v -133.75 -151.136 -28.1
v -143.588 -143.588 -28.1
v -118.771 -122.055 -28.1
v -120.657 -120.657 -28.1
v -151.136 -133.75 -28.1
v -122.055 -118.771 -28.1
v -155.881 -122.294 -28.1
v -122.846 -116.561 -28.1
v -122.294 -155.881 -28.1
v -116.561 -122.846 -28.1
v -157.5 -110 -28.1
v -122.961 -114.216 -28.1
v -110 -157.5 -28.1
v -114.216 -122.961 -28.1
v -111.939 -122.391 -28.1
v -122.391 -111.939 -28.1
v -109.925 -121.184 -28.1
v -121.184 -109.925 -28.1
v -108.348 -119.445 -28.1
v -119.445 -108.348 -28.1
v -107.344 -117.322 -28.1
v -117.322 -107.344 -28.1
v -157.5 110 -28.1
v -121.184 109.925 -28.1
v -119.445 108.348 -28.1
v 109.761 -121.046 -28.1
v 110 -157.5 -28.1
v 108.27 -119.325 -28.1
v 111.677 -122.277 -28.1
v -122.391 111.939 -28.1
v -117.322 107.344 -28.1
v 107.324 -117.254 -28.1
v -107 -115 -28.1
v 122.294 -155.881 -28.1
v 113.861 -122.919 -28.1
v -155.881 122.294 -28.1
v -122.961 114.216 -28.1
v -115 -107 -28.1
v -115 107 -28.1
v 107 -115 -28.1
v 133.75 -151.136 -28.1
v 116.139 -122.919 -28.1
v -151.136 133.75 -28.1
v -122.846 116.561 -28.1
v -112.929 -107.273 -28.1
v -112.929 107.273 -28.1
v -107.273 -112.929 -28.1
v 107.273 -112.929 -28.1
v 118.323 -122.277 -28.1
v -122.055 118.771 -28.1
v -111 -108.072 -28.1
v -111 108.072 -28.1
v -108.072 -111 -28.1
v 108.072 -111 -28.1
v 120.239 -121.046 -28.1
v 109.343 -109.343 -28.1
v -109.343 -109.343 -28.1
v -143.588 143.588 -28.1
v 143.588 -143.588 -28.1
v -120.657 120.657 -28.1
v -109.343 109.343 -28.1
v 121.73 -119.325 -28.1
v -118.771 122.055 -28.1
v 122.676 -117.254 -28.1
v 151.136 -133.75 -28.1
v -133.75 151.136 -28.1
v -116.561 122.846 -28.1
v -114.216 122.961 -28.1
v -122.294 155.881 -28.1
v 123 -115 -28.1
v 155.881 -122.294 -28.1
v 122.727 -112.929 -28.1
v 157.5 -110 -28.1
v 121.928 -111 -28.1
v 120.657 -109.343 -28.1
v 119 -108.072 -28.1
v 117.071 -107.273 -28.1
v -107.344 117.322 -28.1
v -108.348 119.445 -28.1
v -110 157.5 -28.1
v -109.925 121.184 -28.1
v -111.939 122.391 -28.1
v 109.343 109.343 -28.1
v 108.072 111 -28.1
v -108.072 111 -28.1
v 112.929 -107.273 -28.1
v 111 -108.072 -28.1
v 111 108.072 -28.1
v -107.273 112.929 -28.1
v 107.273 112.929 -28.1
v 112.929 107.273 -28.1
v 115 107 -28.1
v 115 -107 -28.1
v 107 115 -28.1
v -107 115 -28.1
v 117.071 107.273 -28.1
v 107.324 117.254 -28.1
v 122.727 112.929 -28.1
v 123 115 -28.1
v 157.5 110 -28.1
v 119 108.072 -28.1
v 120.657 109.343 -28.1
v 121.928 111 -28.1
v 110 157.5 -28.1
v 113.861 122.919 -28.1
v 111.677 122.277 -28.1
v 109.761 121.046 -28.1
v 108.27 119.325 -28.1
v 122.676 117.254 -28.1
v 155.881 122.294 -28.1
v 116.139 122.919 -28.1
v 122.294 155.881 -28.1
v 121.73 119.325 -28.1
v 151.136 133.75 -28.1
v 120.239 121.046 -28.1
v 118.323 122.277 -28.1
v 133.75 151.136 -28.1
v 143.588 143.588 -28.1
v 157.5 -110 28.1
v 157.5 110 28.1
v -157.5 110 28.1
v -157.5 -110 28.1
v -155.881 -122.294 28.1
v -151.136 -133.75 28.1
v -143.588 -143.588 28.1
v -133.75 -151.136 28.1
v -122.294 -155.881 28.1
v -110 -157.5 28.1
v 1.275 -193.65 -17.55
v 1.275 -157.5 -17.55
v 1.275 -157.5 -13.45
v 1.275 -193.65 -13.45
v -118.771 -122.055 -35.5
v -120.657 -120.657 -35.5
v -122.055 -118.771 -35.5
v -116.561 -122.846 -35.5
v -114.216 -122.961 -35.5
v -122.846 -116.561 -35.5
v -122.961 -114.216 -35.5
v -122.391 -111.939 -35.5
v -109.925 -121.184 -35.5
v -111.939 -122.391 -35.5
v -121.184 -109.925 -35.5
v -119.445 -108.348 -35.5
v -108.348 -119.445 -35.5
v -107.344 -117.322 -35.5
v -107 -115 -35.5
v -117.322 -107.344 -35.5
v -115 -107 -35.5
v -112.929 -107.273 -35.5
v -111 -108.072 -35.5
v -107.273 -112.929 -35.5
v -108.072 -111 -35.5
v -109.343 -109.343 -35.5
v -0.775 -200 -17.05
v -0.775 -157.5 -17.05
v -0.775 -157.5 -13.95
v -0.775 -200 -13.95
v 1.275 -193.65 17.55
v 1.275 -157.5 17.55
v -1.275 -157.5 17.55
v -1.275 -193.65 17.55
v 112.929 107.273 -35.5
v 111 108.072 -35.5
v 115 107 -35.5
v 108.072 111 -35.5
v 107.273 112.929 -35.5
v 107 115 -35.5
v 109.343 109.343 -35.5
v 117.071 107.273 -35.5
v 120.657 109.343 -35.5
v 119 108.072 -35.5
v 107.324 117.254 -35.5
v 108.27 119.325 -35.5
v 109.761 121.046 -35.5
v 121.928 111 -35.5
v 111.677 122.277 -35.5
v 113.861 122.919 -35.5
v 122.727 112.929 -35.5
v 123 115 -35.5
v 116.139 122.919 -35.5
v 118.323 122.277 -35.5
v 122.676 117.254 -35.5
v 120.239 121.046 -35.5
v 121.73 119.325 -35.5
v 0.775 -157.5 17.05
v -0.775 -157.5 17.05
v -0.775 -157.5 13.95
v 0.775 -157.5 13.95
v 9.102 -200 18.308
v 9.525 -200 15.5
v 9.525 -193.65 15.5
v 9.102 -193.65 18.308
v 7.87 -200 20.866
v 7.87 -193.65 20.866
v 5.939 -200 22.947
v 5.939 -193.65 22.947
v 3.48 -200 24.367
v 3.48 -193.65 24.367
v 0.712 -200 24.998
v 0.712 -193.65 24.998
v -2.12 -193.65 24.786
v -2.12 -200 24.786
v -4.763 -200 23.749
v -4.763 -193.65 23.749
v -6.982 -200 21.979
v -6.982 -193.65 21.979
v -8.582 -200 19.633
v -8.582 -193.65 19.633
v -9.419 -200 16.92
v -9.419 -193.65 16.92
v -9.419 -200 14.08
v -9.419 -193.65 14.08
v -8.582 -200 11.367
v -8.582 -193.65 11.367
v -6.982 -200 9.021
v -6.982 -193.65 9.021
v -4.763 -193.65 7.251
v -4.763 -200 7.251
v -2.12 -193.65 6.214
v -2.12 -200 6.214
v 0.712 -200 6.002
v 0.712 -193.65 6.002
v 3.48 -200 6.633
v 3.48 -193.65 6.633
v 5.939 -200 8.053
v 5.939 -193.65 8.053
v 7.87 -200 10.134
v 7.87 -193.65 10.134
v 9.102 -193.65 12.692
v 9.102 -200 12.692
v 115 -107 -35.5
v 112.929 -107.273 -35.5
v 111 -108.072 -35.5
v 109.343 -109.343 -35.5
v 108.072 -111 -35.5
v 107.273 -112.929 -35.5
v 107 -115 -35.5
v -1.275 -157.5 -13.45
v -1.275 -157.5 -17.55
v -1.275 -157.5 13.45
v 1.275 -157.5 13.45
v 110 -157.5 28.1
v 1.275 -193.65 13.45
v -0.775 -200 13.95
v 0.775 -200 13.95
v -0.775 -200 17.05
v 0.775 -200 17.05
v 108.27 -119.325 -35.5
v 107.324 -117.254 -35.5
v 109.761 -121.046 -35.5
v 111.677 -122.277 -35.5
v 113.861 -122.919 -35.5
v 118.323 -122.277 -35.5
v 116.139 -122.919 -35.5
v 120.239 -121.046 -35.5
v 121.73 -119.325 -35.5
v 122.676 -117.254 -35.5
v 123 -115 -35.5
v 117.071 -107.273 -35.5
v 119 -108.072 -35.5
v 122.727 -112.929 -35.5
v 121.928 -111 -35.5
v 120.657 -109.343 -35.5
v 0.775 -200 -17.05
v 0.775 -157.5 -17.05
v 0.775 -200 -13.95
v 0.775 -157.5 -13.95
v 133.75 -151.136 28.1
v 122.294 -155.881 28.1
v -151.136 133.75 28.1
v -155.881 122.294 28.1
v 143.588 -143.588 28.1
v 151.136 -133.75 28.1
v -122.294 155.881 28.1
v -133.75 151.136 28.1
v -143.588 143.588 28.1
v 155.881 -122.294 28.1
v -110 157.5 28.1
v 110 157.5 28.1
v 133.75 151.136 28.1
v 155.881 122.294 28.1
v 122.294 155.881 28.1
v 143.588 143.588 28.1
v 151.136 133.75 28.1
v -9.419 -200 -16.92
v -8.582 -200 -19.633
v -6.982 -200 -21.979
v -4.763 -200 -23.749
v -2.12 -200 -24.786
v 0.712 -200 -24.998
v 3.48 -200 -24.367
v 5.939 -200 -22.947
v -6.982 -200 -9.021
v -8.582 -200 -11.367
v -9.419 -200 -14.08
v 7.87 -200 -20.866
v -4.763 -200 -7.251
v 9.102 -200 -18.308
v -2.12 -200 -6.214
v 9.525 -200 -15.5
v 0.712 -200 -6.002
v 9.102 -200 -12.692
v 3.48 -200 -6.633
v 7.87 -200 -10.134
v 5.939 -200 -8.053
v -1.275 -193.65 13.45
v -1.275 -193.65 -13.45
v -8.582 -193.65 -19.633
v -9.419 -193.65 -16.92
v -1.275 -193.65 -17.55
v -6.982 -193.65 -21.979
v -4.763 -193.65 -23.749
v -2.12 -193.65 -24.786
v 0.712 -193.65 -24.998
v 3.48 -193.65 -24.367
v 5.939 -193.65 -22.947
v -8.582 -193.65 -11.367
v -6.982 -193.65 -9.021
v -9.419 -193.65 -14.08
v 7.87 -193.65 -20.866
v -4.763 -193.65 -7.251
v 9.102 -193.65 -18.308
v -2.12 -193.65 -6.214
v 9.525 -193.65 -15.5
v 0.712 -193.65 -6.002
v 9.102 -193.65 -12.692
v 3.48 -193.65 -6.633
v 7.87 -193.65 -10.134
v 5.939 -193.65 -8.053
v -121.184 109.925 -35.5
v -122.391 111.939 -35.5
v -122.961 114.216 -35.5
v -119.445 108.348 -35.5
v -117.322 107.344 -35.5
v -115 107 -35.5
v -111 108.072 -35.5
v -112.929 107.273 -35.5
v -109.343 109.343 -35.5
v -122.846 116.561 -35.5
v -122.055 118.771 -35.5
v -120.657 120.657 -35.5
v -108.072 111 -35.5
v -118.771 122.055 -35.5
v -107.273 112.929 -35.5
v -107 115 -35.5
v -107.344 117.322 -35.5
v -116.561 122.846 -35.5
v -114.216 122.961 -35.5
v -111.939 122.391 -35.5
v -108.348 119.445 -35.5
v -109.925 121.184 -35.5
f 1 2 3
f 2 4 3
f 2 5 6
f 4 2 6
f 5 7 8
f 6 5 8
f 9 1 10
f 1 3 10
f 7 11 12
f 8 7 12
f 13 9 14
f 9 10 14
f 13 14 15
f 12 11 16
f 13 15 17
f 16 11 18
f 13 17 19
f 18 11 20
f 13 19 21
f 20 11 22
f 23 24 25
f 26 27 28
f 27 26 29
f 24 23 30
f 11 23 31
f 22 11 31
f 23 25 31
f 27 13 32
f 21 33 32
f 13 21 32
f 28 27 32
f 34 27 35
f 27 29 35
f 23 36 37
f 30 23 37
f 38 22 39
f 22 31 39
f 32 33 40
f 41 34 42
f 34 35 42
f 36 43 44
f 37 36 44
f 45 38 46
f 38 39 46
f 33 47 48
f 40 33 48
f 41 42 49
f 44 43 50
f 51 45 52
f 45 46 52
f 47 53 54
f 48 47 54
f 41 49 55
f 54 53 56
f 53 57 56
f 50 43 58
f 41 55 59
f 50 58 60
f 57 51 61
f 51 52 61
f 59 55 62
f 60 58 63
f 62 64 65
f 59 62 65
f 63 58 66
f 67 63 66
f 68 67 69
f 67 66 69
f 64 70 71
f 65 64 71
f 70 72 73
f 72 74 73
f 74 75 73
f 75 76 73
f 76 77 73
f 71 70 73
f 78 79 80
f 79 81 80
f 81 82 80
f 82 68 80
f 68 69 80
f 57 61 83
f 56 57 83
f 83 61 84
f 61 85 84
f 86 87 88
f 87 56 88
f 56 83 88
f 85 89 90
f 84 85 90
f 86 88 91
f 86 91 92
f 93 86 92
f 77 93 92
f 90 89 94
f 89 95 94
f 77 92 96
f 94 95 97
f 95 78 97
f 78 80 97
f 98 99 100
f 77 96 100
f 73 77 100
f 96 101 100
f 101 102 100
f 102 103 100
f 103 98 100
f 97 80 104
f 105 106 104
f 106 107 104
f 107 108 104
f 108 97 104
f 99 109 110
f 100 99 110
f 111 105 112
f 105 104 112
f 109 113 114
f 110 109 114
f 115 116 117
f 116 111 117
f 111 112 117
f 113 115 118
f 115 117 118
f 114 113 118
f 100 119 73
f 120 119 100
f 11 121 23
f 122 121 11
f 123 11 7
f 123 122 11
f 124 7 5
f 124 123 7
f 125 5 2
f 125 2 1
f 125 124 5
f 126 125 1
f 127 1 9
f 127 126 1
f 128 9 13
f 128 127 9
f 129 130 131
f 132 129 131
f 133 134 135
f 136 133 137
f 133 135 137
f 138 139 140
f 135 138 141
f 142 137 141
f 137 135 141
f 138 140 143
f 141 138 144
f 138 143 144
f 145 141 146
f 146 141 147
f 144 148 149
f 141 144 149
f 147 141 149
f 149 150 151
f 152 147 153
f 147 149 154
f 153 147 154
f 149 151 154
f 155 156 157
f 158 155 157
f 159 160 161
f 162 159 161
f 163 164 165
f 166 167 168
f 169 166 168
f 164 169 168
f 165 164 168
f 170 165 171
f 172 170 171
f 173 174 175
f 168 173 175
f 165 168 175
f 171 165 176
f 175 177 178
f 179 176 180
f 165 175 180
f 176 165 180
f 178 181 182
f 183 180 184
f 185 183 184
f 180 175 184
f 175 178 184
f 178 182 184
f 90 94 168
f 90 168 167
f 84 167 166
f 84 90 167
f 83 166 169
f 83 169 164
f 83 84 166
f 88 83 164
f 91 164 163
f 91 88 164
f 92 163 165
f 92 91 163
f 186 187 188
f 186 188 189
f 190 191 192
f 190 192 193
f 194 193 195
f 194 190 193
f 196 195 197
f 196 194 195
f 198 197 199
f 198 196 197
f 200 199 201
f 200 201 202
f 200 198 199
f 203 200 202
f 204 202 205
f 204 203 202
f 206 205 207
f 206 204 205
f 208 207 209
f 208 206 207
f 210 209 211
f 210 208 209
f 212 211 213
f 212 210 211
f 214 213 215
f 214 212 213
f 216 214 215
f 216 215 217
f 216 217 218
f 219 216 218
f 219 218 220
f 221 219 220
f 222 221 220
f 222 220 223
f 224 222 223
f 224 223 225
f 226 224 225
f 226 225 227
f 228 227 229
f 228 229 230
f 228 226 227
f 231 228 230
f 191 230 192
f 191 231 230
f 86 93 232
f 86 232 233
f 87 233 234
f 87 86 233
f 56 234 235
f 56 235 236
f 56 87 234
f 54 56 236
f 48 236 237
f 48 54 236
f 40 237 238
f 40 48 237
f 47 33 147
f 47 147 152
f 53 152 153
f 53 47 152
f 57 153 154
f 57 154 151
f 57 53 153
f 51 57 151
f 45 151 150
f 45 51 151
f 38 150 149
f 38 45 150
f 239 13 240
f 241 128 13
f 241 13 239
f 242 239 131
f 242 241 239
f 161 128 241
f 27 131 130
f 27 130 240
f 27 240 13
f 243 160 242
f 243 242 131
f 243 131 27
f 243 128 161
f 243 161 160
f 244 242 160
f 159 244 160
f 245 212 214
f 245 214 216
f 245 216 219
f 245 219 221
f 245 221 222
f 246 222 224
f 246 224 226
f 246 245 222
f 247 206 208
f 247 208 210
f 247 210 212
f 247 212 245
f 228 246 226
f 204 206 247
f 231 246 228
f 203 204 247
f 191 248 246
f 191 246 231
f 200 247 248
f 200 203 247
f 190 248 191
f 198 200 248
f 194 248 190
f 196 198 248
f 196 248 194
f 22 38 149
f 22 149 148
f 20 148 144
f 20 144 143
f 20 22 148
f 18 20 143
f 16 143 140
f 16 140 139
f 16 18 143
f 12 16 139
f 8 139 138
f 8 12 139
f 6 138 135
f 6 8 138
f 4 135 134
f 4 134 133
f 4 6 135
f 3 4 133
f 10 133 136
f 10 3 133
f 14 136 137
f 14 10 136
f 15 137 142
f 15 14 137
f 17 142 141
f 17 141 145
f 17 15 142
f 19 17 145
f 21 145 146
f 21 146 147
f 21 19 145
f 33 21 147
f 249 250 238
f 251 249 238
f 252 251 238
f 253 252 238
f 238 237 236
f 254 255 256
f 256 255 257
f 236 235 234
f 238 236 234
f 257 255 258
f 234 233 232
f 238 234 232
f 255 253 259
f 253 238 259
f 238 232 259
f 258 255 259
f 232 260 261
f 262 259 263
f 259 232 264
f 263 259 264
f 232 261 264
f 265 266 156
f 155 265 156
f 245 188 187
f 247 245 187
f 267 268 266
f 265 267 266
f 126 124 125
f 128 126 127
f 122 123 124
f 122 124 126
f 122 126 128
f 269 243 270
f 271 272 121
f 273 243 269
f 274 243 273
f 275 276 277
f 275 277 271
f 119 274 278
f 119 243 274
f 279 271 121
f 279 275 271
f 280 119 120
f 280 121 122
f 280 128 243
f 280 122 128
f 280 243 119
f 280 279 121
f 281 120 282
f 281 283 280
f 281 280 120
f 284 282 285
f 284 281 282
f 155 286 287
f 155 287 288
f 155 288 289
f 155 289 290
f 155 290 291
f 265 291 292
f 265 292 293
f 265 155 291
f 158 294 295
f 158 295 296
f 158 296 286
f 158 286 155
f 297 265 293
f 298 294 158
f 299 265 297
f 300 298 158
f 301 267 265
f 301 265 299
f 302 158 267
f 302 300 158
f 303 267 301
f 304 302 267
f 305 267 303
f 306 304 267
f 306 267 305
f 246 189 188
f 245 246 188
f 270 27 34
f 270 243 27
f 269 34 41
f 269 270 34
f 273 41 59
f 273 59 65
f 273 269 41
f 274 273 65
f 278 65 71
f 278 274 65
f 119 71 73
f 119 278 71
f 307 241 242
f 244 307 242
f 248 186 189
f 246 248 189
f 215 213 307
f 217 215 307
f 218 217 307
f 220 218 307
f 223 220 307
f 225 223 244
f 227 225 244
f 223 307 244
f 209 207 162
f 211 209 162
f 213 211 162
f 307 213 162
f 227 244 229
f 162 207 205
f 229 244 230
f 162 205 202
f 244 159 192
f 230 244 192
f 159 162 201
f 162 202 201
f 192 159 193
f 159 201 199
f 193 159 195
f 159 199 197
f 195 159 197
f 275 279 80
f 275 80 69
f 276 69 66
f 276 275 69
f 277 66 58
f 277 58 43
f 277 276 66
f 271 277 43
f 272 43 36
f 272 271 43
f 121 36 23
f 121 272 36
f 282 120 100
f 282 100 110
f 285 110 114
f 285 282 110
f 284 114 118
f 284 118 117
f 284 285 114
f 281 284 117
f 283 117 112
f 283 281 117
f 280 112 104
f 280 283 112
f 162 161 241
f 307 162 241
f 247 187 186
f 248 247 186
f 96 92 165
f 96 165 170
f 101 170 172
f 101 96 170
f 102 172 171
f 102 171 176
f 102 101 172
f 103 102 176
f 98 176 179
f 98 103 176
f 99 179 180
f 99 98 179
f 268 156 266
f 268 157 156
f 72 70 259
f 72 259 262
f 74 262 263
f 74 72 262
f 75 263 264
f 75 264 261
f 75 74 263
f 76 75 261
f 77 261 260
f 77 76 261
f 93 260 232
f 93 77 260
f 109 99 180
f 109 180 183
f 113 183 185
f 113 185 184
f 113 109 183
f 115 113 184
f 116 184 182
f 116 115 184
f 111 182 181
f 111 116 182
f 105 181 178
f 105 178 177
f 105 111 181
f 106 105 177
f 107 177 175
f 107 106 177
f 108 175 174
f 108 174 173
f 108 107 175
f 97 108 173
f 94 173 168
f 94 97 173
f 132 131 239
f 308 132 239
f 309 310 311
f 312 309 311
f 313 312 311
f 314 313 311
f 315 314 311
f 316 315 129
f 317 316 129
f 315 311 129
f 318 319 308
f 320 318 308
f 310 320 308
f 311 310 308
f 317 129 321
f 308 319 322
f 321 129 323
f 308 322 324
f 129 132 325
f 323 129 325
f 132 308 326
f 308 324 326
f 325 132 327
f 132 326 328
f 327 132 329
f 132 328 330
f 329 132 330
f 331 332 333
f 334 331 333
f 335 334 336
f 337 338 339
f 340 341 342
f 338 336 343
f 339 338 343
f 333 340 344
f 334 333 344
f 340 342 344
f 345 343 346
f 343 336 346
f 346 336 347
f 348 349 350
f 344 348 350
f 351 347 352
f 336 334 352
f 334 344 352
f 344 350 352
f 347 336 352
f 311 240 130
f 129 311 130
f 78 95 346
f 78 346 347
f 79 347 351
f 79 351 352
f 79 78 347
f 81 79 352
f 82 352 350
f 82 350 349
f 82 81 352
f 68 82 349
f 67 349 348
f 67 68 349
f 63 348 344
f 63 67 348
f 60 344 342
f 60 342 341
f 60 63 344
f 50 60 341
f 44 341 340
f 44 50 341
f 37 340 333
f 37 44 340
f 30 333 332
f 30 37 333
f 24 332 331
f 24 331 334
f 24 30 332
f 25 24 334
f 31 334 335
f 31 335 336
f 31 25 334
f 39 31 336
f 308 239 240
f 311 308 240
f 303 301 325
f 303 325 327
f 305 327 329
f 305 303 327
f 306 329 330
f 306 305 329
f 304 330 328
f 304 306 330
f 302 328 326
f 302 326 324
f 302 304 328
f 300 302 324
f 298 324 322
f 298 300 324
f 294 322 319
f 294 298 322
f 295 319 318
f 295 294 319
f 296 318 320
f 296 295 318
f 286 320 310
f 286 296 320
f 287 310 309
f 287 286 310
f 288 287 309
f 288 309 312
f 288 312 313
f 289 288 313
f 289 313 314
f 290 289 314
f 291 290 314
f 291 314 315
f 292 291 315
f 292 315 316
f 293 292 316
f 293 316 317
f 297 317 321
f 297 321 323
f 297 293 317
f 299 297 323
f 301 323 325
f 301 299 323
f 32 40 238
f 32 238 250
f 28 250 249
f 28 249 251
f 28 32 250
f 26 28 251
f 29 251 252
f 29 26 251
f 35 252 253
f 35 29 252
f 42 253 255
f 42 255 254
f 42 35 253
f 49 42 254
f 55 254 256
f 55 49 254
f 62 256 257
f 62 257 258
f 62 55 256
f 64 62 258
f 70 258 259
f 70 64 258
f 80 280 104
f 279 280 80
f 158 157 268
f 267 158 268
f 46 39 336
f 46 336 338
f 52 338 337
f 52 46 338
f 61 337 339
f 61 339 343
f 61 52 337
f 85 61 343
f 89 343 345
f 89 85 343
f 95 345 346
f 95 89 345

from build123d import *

# Parameters (mm, degrees)
F1_DEPTH = 28.1
F2_DEPTH = 35.5
F4_DEPTH = 42.5
F5_R     = 9.525
F6_DEPTH = 6.35
F7_R     = 9.525
F8_DEPTH = 6.35


with BuildPart() as f1:
    # F0 (on Top) → F1 (new body, symmetric)
    with BuildSketch(Plane.XY):
        with BuildLine():
            Line((107, -115), (0, -115))
            Line((0, -115), (0, -157.5))
            Line((0, -157.5), (110, -157.5))
            ThreePointArc((110, -157.5), (143.5875721064, -143.5875721064), (157.5, -110))
            Line((157.5, -110), (157.5, 0))
            Line((157.5, 0), (115, 0))
            Line((115, 0), (115, -107))
            ThreePointArc((115, -107), (120.6568542495, -109.3431457505), (123, -115))
            ThreePointArc((123, -115), (115, -123), (107, -115))
        make_face()
        with BuildLine():
            Line((115, 0), (0, 0))
            Line((0, 0), (0, -115))
            Line((0, -115), (107, -115))
            ThreePointArc((107, -115), (109.3431457505, -109.3431457505), (115, -107))
            Line((115, -107), (115, 0))
        make_face()
        with BuildLine():
            Line((115, 107), (115, 0))
            Line((115, 0), (157.5, 0))
            Line((157.5, 0), (157.5, 110))
            ThreePointArc((157.5, 110), (143.5875721064, 143.5875721064), (110, 157.5))
            Line((110, 157.5), (0, 157.5))
            Line((0, 157.5), (0, 142.7501142025))
            Line((0, 142.7501142025), (0, 115))
            Line((0, 115), (107, 115))
            ThreePointArc((107, 115), (115, 123), (123, 115))
            ThreePointArc((123, 115), (120.6568542495, 109.3431457505), (115, 107))
        make_face()
        with BuildLine():
            Line((0, 115), (0, 0))
            Line((0, 0), (115, 0))
            Line((115, 0), (115, 107))
            ThreePointArc((115, 107), (109.3431457505, 109.3431457505), (107, 115))
            Line((107, 115), (0, 115))
        make_face()
        with BuildLine():
            Line((-115, 0), (0, 0))
            Line((0, 0), (0, 115))
            Line((0, 115), (-107, 115))
            ThreePointArc((-107, 115), (-109.3431457505, 109.3431457505), (-115, 107))
            Line((-115, 107), (-115, 0))
        make_face()
        with BuildLine():
            Line((-157.5, 0), (-115, 0))
            Line((-115, 0), (-115, 107))
            ThreePointArc((-115, 107), (-120.6568542495, 120.6568542495), (-107, 115))
            Line((-107, 115), (0, 115))
            Line((0, 115), (0, 142.7501142025))
            Line((0, 142.7501142025), (0, 157.5))
            Line((0, 157.5), (-110, 157.5))
            ThreePointArc((-110, 157.5), (-143.5875721064, 143.5875721064), (-157.5, 110))
            Line((-157.5, 110), (-157.5, 0))
        make_face()
        with BuildLine():
            Line((0, -115), (0, 0))
            Line((0, 0), (-115, 0))
            Line((-115, 0), (-115, -107))
            ThreePointArc((-115, -107), (-109.3431457505, -109.3431457505), (-107, -115))
            Line((-107, -115), (0, -115))
        make_face()
        with BuildLine():
            Line((0, -157.5), (0, -115))
            Line((0, -115), (-107, -115))
            ThreePointArc((-107, -115), (-120.6568542495, -120.6568542495), (-115, -107))
            Line((-115, -107), (-115, 0))
            Line((-115, 0), (-157.5, 0))
            Line((-157.5, 0), (-157.5, -110))
            ThreePointArc((-157.5, -110), (-143.5875721064, -143.5875721064), (-110, -157.5))
            Line((-110, -157.5), (0, -157.5))
        make_face()
        with BuildLine():
            Line((115, -115), (107, -115))
            ThreePointArc((107, -115), (115, -123), (123, -115))
            ThreePointArc((123, -115), (120.6568542495, -109.3431457505), (115, -107))
            Line((115, -107), (115, -115))
        make_face()
        with BuildLine():
            ThreePointArc((115, -107), (109.3431457505, -109.3431457505), (107, -115))
            Line((107, -115), (115, -115))
            Line((115, -115), (115, -107))
        make_face()
        with BuildLine():
            ThreePointArc((-115, -107), (-120.6568542495, -120.6568542495), (-107, -115))
            Line((-107, -115), (-115, -115))
            Line((-115, -115), (-115, -107))
        make_face()
        with BuildLine():
            Line((-115, -115), (-107, -115))
            ThreePointArc((-107, -115), (-109.3431457505, -109.3431457505), (-115, -107))
            Line((-115, -107), (-115, -115))
        make_face()
        with BuildLine():
            Line((115, 115), (115, 107))
            ThreePointArc((115, 107), (120.6568542495, 109.3431457505), (123, 115))
            ThreePointArc((123, 115), (115, 123), (107, 115))
            Line((107, 115), (115, 115))
        make_face()
        with BuildLine():
            ThreePointArc((107, 115), (109.3431457505, 109.3431457505), (115, 107))
            Line((115, 107), (115, 115))
            Line((115, 115), (107, 115))
        make_face()
        with BuildLine():
            ThreePointArc((-107, 115), (-120.6568542495, 120.6568542495), (-115, 107))
            Line((-115, 107), (-115, 115))
            Line((-115, 115), (-107, 115))
        make_face()
        with BuildLine():
            Line((-115, 115), (-115, 107))
            ThreePointArc((-115, 107), (-109.3431457505, 109.3431457505), (-107, 115))
            Line((-107, 115), (-115, 115))
        make_face()
    extrude(amount=F1_DEPTH, both=True)

    # F0 (on Top) → F2 (join)
    with BuildSketch(Plane.XY):
        with BuildLine():
            ThreePointArc((-115, -107), (-120.6568542495, -120.6568542495), (-107, -115))
            Line((-107, -115), (-115, -115))
            Line((-115, -115), (-115, -107))
        make_face()
        with BuildLine():
            Line((-115, -115), (-107, -115))
            ThreePointArc((-107, -115), (-109.3431457505, -109.3431457505), (-115, -107))
            Line((-115, -107), (-115, -115))
        make_face()
        with BuildLine():
            Line((115, -115), (107, -115))
            ThreePointArc((107, -115), (115, -123), (123, -115))
            ThreePointArc((123, -115), (120.6568542495, -109.3431457505), (115, -107))
            Line((115, -107), (115, -115))
        make_face()
        with BuildLine():
            ThreePointArc((115, -107), (109.3431457505, -109.3431457505), (107, -115))
            Line((107, -115), (115, -115))
            Line((115, -115), (115, -107))
        make_face()
        with BuildLine():
            Line((115, 115), (115, 107))
            ThreePointArc((115, 107), (120.6568542495, 109.3431457505), (123, 115))
            ThreePointArc((123, 115), (115, 123), (107, 115))
            Line((107, 115), (115, 115))
        make_face()
        with BuildLine():
            ThreePointArc((107, 115), (109.3431457505, 109.3431457505), (115, 107))
            Line((115, 107), (115, 115))
            Line((115, 115), (107, 115))
        make_face()
        with BuildLine():
            ThreePointArc((-107, 115), (-120.6568542495, 120.6568542495), (-115, 107))
            Line((-115, 107), (-115, 115))
            Line((-115, 115), (-107, 115))
        make_face()
        with BuildLine():
            Line((-115, 115), (-115, 107))
            ThreePointArc((-115, 107), (-109.3431457505, 109.3431457505), (-107, 115))
            Line((-107, 115), (-115, 115))
        make_face()
    extrude(amount=-F2_DEPTH)

    # F3 (on face) → F4 (join)
    with BuildSketch(Plane.XZ.offset(157.5)):
        Polygon((0, -13.95), (0, -13.45), (-1.275, -13.45), (-1.275, -17.55), (1.275, -17.55), (1.275, -15.5), (0.775, -15.5), (0.775, -17.05), (-0.775, -17.05), (-0.775, -13.95), align=None)
        Polygon((1.275, -13.45), (0, -13.45), (0, -13.95), (0.775, -13.95), (0.775, -15.5), (1.275, -15.5), align=None)
        Polygon((-1.275, 13.45), (0, 13.45), (0, 13.95), (-0.775, 13.95), (-0.775, 17.05), (0.775, 17.05), (0.775, 15.5), (1.275, 15.5), (1.275, 17.55), (-1.275, 17.55), align=None)
        Polygon((0, 13.95), (0, 13.45), (1.275, 13.45), (1.275, 15.5), (0.775, 15.5), (0.775, 13.95), align=None)
    extrude(amount=F4_DEPTH)

    # F5 (on face) → F6 (join)
    with BuildSketch(Plane.XZ.offset(200)):
        with Locations((0, 15.5)):
            Circle(F5_R)
        Polygon((-1.275, 13.45), (-1.275, 15.5), (-1.275, 17.55), (0, 17.55), (1.275, 17.55), (1.275, 15.5), (1.275, 13.45), (0, 13.45), align=None, mode=Mode.SUBTRACT)
    extrude(amount=-F6_DEPTH)

    # F7 (on face) → F8 (join)
    with BuildSketch(Plane.XZ.offset(200)):
        with Locations((0, -15.5)):
            Circle(F7_R)
        Polygon((-1.275, -17.55), (-1.275, -15.5), (-1.275, -13.45), (0, -13.45), (1.275, -13.45), (1.275, -15.5), (1.275, -17.55), (0, -17.55), align=None, mode=Mode.SUBTRACT)
    extrude(amount=-F8_DEPTH)


solid = f1.part
